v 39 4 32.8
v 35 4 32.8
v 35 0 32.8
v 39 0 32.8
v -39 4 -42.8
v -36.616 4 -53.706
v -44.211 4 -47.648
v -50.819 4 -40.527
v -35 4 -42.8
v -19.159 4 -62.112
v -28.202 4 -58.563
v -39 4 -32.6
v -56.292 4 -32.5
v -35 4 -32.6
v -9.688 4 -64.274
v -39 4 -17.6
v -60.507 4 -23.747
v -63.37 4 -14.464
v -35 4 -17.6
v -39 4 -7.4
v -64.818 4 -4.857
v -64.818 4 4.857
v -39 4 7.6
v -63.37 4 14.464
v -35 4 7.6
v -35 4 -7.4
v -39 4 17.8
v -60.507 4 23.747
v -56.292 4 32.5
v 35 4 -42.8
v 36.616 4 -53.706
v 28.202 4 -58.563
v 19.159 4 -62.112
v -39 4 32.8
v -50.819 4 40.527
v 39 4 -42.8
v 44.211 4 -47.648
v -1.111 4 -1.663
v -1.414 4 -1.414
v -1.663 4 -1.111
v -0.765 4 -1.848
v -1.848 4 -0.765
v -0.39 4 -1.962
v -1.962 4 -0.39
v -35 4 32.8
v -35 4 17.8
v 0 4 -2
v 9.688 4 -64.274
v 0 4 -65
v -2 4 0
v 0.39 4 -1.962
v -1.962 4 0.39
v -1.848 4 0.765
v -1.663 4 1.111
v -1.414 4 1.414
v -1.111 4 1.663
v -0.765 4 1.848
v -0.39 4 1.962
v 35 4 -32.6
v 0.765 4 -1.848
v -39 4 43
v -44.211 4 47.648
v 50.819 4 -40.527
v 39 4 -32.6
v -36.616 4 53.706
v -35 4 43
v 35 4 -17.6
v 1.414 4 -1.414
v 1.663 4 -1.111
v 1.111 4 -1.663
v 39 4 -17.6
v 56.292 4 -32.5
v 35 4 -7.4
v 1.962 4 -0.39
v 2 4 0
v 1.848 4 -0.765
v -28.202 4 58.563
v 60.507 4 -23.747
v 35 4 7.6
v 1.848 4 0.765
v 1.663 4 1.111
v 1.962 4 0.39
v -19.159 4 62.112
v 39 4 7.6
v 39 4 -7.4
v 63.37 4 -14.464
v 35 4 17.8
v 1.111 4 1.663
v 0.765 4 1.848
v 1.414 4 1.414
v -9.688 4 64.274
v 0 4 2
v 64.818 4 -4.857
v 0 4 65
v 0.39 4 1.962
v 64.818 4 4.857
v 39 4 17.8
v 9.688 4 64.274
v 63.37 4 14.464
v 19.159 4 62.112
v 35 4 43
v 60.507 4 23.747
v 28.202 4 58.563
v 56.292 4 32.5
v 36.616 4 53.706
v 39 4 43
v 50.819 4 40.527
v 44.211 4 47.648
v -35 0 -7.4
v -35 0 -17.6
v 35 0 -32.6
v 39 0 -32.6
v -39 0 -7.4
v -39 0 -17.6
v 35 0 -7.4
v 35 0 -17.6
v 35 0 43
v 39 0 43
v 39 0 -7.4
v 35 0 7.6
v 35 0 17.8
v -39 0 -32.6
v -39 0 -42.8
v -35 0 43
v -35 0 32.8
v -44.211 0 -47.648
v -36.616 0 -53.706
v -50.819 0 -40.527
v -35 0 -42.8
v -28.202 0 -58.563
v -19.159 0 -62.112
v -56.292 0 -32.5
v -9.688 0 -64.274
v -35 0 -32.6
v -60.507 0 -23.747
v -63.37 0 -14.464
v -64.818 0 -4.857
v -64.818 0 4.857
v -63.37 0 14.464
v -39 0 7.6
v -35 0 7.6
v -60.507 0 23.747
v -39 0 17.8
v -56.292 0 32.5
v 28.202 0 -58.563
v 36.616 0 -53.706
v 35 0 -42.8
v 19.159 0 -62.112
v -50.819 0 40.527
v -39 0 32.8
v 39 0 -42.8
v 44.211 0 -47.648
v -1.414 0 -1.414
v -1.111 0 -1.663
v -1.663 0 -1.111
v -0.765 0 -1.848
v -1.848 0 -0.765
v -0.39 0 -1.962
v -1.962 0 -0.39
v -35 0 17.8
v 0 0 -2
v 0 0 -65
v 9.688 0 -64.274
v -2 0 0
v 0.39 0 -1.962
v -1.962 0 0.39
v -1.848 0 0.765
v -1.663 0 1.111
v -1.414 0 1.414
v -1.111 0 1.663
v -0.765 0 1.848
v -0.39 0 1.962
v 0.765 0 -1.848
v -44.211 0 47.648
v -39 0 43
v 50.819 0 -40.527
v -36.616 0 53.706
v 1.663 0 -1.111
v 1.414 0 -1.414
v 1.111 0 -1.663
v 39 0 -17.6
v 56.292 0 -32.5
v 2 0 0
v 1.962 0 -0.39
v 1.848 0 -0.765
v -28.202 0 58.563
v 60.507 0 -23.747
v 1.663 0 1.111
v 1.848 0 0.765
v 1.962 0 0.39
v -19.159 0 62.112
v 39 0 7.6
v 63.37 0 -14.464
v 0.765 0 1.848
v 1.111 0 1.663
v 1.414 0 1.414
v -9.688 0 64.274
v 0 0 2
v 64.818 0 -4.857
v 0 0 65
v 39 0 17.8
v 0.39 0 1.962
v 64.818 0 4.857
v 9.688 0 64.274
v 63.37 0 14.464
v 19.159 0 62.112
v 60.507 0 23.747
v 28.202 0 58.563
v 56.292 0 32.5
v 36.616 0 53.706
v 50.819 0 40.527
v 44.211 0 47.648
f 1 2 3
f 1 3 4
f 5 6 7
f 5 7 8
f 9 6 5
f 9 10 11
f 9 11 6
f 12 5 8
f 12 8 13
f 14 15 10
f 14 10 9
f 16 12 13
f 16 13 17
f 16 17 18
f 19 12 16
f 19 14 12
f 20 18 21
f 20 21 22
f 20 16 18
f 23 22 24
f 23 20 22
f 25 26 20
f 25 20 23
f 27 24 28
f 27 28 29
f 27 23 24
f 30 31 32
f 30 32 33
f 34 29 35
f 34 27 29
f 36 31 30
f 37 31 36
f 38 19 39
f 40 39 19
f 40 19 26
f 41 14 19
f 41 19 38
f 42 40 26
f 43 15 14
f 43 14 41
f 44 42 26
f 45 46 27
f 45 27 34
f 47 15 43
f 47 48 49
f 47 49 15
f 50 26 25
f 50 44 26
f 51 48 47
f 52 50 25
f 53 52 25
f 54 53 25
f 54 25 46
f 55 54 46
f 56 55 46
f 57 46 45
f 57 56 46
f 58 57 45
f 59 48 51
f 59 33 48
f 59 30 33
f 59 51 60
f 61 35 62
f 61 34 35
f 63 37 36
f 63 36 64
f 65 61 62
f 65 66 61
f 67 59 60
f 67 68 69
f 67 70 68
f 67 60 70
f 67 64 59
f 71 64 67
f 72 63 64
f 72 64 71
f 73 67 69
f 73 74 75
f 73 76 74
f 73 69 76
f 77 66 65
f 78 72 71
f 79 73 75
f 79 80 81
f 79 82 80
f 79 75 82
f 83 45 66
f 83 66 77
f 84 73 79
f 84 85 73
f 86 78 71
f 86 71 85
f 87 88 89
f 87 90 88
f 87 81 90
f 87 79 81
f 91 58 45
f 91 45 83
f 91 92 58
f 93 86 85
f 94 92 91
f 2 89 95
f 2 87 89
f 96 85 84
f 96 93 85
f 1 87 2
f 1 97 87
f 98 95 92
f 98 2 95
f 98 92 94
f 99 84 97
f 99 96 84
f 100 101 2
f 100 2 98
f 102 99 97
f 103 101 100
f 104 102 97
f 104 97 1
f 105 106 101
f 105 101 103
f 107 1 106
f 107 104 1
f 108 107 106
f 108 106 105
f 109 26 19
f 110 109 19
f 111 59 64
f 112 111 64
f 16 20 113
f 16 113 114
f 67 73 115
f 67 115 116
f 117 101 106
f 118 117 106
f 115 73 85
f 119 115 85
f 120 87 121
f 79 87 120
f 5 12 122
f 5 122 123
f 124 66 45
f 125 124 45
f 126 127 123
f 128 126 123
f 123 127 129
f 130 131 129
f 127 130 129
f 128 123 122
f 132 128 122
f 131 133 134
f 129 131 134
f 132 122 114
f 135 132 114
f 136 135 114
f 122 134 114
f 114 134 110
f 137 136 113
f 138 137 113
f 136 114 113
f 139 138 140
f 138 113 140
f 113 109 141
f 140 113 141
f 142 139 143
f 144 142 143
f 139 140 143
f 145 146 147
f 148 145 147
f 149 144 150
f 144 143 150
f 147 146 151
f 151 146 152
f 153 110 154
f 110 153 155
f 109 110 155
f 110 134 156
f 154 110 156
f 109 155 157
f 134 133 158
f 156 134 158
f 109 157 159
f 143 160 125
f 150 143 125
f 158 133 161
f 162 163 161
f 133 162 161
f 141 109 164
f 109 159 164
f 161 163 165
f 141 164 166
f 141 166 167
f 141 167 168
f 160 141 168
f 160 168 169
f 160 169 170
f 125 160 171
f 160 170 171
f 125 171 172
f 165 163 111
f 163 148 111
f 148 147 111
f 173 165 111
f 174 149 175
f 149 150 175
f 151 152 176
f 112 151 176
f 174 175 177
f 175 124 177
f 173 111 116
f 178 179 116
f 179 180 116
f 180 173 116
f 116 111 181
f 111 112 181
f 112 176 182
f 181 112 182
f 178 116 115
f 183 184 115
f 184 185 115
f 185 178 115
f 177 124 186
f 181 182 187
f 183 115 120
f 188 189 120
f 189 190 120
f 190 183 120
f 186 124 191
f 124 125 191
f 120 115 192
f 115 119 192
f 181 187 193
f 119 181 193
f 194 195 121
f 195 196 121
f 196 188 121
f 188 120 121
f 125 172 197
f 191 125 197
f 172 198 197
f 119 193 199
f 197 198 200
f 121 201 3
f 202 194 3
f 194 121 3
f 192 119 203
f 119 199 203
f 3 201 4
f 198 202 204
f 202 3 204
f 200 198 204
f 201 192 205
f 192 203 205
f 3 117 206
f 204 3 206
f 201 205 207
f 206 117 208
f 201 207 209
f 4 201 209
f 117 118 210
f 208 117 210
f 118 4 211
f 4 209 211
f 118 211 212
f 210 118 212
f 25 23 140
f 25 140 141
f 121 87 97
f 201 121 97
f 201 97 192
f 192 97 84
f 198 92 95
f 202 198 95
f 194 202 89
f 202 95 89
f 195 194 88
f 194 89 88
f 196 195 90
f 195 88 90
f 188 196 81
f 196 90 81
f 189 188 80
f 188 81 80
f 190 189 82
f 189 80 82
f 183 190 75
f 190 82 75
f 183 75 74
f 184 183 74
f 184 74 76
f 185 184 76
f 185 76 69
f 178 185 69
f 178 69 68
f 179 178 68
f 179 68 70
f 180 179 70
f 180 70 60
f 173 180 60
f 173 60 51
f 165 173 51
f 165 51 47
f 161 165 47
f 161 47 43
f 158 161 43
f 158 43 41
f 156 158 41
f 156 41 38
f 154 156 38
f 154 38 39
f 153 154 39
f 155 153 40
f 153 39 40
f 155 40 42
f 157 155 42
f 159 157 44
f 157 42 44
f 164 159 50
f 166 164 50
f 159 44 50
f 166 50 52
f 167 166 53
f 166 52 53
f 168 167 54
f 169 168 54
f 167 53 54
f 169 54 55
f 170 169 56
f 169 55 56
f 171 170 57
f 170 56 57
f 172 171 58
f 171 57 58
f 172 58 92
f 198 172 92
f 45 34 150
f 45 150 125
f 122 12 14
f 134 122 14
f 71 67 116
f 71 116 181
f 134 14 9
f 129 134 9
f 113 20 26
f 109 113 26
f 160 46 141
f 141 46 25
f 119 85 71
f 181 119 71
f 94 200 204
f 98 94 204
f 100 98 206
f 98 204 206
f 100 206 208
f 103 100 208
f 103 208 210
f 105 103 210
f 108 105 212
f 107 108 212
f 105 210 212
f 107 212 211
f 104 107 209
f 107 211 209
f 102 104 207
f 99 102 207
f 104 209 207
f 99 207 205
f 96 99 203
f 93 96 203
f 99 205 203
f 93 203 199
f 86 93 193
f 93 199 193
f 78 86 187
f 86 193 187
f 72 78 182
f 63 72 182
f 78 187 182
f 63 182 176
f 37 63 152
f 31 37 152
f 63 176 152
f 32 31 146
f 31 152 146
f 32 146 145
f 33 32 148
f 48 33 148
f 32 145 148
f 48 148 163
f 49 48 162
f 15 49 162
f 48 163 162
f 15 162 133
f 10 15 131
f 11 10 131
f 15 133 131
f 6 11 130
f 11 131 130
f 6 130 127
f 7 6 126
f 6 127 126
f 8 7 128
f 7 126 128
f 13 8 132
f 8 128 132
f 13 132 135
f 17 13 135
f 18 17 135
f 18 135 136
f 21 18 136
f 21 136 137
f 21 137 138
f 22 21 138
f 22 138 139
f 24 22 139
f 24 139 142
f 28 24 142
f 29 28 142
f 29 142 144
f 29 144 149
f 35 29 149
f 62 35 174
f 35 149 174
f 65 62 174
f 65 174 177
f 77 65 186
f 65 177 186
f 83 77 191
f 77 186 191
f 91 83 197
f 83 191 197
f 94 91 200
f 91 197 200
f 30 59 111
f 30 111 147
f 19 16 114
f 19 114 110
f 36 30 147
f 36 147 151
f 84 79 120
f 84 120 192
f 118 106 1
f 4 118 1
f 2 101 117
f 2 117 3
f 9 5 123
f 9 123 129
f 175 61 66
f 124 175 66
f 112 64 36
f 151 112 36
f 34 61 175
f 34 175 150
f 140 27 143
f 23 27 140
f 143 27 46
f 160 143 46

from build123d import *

# Parameters (mm, degrees)
CROQUIS2_R              = 65
SALIENTE_EXTRUIR1_DEPTH = 4
CORTAR_EXTRUIR6_REACH   = 94.011
CROQUIS3_W              = 4
CROQUIS3_H              = 10.2
CROQUIS4_R              = 2
CORTAR_EXTRUIR7_DEPTH   = 10


with BuildPart() as part:
    # Croquis2 → Saliente-Extruir1 (new body)
    with BuildSketch(Plane(origin=(0, 0, 0), x_dir=(1, 0, 0), z_dir=(0, 1, 0))):
        with Locations(Location((0, 0, 0), (0, 0, 270))):
            Circle(CROQUIS2_R)
    extrude(amount=SALIENTE_EXTRUIR1_DEPTH)

    # Croquis3 → Cortar-Extruir6 (cut, up to next)
    with BuildSketch(Plane(origin=(0, 4, 0), x_dir=(1, 0, 0), z_dir=(0, 1, 0)), mode=Mode.PRIVATE) as cortar_extruir6_sk1:
        with Locations((-37, 12.5)):
            Rectangle(CROQUIS3_W, CROQUIS3_H)
    cortar_extruir6_tool1 = extrude(cortar_extruir6_sk1.sketch, amount=-CORTAR_EXTRUIR6_REACH, mode=Mode.PRIVATE) & part.part
    # Croquis3 → Cortar-Extruir6 (cut, up to next)
    with BuildSketch(Plane(origin=(0, 4, 0), x_dir=(1, 0, 0), z_dir=(0, 1, 0)), mode=Mode.PRIVATE) as cortar_extruir6_sk2:
        with Locations((-37, -12.7)):
            Rectangle(CROQUIS3_W, CROQUIS3_H)
    cortar_extruir6_tool2 = extrude(cortar_extruir6_sk2.sketch, amount=-CORTAR_EXTRUIR6_REACH, mode=Mode.PRIVATE) & part.part
    # Croquis3 → Cortar-Extruir6 (cut, up to next)
    with BuildSketch(Plane(origin=(0, 4, 0), x_dir=(1, 0, 0), z_dir=(0, 1, 0)), mode=Mode.PRIVATE) as cortar_extruir6_sk3:
        with Locations((-37, -37.9)):
            Rectangle(CROQUIS3_W, CROQUIS3_H)
    cortar_extruir6_tool3 = extrude(cortar_extruir6_sk3.sketch, amount=-CORTAR_EXTRUIR6_REACH, mode=Mode.PRIVATE) & part.part
    # Croquis3 → Cortar-Extruir6 (cut, up to next)
    with BuildSketch(Plane(origin=(0, 4, 0), x_dir=(1, 0, 0), z_dir=(0, 1, 0)), mode=Mode.PRIVATE) as cortar_extruir6_sk4:
        with Locations((-37, 37.7)):
            Rectangle(CROQUIS3_W, CROQUIS3_H)
    cortar_extruir6_tool4 = extrude(cortar_extruir6_sk4.sketch, amount=-CORTAR_EXTRUIR6_REACH, mode=Mode.PRIVATE) & part.part
    # Croquis3 → Cortar-Extruir6 (cut, up to next)
    with BuildSketch(Plane(origin=(0, 4, 0), x_dir=(1, 0, 0), z_dir=(0, 1, 0)), mode=Mode.PRIVATE) as cortar_extruir6_sk5:
        with Locations((37, 37.7)):
            Rectangle(CROQUIS3_W, CROQUIS3_H)
    cortar_extruir6_tool5 = extrude(cortar_extruir6_sk5.sketch, amount=-CORTAR_EXTRUIR6_REACH, mode=Mode.PRIVATE) & part.part
    # Croquis3 → Cortar-Extruir6 (cut, up to next)
    with BuildSketch(Plane(origin=(0, 4, 0), x_dir=(1, 0, 0), z_dir=(0, 1, 0)), mode=Mode.PRIVATE) as cortar_extruir6_sk6:
        with Locations((37, 12.5)):
            Rectangle(CROQUIS3_W, CROQUIS3_H)
    cortar_extruir6_tool6 = extrude(cortar_extruir6_sk6.sketch, amount=-CORTAR_EXTRUIR6_REACH, mode=Mode.PRIVATE) & part.part
    # Croquis3 → Cortar-Extruir6 (cut, up to next)
    with BuildSketch(Plane(origin=(0, 4, 0), x_dir=(1, 0, 0), z_dir=(0, 1, 0)), mode=Mode.PRIVATE) as cortar_extruir6_sk7:
        with Locations((37, -12.7)):
            Rectangle(CROQUIS3_W, CROQUIS3_H)
    cortar_extruir6_tool7 = extrude(cortar_extruir6_sk7.sketch, amount=-CORTAR_EXTRUIR6_REACH, mode=Mode.PRIVATE) & part.part
    # Croquis3 → Cortar-Extruir6 (cut, up to next)
    with BuildSketch(Plane(origin=(0, 4, 0), x_dir=(1, 0, 0), z_dir=(0, 1, 0)), mode=Mode.PRIVATE) as cortar_extruir6_sk8:
        with Locations((37, -37.9)):
            Rectangle(CROQUIS3_W, CROQUIS3_H)
    cortar_extruir6_tool8 = extrude(cortar_extruir6_sk8.sketch, amount=-CORTAR_EXTRUIR6_REACH, mode=Mode.PRIVATE) & part.part
    add(cortar_extruir6_tool1.solids().sort_by_distance((-37, 4, -12.5))[0], mode=Mode.SUBTRACT)
    add(cortar_extruir6_tool2.solids().sort_by_distance((-37, 4, 12.7))[0], mode=Mode.SUBTRACT)
    add(cortar_extruir6_tool3.solids().sort_by_distance((-37, 4, 37.9))[0], mode=Mode.SUBTRACT)
    add(cortar_extruir6_tool4.solids().sort_by_distance((-37, 4, -37.7))[0], mode=Mode.SUBTRACT)
    add(cortar_extruir6_tool5.solids().sort_by_distance((37, 4, -37.7))[0], mode=Mode.SUBTRACT)
    add(cortar_extruir6_tool6.solids().sort_by_distance((37, 4, -12.5))[0], mode=Mode.SUBTRACT)
    add(cortar_extruir6_tool7.solids().sort_by_distance((37, 4, 12.7))[0], mode=Mode.SUBTRACT)
    add(cortar_extruir6_tool8.solids().sort_by_distance((37, 4, 37.9))[0], mode=Mode.SUBTRACT)

    # Croquis4 → Cortar-Extruir7 (cut)
    with BuildSketch(Plane(origin=(0, 4, 0), x_dir=(1, 0, 0), z_dir=(0, 1, 0))):
        with Locations(Location((0, 0, 0), (0, 0, 270))):
            Circle(CROQUIS4_R)
    extrude(amount=-CORTAR_EXTRUIR7_DEPTH, mode=Mode.SUBTRACT)


solid = part.part
